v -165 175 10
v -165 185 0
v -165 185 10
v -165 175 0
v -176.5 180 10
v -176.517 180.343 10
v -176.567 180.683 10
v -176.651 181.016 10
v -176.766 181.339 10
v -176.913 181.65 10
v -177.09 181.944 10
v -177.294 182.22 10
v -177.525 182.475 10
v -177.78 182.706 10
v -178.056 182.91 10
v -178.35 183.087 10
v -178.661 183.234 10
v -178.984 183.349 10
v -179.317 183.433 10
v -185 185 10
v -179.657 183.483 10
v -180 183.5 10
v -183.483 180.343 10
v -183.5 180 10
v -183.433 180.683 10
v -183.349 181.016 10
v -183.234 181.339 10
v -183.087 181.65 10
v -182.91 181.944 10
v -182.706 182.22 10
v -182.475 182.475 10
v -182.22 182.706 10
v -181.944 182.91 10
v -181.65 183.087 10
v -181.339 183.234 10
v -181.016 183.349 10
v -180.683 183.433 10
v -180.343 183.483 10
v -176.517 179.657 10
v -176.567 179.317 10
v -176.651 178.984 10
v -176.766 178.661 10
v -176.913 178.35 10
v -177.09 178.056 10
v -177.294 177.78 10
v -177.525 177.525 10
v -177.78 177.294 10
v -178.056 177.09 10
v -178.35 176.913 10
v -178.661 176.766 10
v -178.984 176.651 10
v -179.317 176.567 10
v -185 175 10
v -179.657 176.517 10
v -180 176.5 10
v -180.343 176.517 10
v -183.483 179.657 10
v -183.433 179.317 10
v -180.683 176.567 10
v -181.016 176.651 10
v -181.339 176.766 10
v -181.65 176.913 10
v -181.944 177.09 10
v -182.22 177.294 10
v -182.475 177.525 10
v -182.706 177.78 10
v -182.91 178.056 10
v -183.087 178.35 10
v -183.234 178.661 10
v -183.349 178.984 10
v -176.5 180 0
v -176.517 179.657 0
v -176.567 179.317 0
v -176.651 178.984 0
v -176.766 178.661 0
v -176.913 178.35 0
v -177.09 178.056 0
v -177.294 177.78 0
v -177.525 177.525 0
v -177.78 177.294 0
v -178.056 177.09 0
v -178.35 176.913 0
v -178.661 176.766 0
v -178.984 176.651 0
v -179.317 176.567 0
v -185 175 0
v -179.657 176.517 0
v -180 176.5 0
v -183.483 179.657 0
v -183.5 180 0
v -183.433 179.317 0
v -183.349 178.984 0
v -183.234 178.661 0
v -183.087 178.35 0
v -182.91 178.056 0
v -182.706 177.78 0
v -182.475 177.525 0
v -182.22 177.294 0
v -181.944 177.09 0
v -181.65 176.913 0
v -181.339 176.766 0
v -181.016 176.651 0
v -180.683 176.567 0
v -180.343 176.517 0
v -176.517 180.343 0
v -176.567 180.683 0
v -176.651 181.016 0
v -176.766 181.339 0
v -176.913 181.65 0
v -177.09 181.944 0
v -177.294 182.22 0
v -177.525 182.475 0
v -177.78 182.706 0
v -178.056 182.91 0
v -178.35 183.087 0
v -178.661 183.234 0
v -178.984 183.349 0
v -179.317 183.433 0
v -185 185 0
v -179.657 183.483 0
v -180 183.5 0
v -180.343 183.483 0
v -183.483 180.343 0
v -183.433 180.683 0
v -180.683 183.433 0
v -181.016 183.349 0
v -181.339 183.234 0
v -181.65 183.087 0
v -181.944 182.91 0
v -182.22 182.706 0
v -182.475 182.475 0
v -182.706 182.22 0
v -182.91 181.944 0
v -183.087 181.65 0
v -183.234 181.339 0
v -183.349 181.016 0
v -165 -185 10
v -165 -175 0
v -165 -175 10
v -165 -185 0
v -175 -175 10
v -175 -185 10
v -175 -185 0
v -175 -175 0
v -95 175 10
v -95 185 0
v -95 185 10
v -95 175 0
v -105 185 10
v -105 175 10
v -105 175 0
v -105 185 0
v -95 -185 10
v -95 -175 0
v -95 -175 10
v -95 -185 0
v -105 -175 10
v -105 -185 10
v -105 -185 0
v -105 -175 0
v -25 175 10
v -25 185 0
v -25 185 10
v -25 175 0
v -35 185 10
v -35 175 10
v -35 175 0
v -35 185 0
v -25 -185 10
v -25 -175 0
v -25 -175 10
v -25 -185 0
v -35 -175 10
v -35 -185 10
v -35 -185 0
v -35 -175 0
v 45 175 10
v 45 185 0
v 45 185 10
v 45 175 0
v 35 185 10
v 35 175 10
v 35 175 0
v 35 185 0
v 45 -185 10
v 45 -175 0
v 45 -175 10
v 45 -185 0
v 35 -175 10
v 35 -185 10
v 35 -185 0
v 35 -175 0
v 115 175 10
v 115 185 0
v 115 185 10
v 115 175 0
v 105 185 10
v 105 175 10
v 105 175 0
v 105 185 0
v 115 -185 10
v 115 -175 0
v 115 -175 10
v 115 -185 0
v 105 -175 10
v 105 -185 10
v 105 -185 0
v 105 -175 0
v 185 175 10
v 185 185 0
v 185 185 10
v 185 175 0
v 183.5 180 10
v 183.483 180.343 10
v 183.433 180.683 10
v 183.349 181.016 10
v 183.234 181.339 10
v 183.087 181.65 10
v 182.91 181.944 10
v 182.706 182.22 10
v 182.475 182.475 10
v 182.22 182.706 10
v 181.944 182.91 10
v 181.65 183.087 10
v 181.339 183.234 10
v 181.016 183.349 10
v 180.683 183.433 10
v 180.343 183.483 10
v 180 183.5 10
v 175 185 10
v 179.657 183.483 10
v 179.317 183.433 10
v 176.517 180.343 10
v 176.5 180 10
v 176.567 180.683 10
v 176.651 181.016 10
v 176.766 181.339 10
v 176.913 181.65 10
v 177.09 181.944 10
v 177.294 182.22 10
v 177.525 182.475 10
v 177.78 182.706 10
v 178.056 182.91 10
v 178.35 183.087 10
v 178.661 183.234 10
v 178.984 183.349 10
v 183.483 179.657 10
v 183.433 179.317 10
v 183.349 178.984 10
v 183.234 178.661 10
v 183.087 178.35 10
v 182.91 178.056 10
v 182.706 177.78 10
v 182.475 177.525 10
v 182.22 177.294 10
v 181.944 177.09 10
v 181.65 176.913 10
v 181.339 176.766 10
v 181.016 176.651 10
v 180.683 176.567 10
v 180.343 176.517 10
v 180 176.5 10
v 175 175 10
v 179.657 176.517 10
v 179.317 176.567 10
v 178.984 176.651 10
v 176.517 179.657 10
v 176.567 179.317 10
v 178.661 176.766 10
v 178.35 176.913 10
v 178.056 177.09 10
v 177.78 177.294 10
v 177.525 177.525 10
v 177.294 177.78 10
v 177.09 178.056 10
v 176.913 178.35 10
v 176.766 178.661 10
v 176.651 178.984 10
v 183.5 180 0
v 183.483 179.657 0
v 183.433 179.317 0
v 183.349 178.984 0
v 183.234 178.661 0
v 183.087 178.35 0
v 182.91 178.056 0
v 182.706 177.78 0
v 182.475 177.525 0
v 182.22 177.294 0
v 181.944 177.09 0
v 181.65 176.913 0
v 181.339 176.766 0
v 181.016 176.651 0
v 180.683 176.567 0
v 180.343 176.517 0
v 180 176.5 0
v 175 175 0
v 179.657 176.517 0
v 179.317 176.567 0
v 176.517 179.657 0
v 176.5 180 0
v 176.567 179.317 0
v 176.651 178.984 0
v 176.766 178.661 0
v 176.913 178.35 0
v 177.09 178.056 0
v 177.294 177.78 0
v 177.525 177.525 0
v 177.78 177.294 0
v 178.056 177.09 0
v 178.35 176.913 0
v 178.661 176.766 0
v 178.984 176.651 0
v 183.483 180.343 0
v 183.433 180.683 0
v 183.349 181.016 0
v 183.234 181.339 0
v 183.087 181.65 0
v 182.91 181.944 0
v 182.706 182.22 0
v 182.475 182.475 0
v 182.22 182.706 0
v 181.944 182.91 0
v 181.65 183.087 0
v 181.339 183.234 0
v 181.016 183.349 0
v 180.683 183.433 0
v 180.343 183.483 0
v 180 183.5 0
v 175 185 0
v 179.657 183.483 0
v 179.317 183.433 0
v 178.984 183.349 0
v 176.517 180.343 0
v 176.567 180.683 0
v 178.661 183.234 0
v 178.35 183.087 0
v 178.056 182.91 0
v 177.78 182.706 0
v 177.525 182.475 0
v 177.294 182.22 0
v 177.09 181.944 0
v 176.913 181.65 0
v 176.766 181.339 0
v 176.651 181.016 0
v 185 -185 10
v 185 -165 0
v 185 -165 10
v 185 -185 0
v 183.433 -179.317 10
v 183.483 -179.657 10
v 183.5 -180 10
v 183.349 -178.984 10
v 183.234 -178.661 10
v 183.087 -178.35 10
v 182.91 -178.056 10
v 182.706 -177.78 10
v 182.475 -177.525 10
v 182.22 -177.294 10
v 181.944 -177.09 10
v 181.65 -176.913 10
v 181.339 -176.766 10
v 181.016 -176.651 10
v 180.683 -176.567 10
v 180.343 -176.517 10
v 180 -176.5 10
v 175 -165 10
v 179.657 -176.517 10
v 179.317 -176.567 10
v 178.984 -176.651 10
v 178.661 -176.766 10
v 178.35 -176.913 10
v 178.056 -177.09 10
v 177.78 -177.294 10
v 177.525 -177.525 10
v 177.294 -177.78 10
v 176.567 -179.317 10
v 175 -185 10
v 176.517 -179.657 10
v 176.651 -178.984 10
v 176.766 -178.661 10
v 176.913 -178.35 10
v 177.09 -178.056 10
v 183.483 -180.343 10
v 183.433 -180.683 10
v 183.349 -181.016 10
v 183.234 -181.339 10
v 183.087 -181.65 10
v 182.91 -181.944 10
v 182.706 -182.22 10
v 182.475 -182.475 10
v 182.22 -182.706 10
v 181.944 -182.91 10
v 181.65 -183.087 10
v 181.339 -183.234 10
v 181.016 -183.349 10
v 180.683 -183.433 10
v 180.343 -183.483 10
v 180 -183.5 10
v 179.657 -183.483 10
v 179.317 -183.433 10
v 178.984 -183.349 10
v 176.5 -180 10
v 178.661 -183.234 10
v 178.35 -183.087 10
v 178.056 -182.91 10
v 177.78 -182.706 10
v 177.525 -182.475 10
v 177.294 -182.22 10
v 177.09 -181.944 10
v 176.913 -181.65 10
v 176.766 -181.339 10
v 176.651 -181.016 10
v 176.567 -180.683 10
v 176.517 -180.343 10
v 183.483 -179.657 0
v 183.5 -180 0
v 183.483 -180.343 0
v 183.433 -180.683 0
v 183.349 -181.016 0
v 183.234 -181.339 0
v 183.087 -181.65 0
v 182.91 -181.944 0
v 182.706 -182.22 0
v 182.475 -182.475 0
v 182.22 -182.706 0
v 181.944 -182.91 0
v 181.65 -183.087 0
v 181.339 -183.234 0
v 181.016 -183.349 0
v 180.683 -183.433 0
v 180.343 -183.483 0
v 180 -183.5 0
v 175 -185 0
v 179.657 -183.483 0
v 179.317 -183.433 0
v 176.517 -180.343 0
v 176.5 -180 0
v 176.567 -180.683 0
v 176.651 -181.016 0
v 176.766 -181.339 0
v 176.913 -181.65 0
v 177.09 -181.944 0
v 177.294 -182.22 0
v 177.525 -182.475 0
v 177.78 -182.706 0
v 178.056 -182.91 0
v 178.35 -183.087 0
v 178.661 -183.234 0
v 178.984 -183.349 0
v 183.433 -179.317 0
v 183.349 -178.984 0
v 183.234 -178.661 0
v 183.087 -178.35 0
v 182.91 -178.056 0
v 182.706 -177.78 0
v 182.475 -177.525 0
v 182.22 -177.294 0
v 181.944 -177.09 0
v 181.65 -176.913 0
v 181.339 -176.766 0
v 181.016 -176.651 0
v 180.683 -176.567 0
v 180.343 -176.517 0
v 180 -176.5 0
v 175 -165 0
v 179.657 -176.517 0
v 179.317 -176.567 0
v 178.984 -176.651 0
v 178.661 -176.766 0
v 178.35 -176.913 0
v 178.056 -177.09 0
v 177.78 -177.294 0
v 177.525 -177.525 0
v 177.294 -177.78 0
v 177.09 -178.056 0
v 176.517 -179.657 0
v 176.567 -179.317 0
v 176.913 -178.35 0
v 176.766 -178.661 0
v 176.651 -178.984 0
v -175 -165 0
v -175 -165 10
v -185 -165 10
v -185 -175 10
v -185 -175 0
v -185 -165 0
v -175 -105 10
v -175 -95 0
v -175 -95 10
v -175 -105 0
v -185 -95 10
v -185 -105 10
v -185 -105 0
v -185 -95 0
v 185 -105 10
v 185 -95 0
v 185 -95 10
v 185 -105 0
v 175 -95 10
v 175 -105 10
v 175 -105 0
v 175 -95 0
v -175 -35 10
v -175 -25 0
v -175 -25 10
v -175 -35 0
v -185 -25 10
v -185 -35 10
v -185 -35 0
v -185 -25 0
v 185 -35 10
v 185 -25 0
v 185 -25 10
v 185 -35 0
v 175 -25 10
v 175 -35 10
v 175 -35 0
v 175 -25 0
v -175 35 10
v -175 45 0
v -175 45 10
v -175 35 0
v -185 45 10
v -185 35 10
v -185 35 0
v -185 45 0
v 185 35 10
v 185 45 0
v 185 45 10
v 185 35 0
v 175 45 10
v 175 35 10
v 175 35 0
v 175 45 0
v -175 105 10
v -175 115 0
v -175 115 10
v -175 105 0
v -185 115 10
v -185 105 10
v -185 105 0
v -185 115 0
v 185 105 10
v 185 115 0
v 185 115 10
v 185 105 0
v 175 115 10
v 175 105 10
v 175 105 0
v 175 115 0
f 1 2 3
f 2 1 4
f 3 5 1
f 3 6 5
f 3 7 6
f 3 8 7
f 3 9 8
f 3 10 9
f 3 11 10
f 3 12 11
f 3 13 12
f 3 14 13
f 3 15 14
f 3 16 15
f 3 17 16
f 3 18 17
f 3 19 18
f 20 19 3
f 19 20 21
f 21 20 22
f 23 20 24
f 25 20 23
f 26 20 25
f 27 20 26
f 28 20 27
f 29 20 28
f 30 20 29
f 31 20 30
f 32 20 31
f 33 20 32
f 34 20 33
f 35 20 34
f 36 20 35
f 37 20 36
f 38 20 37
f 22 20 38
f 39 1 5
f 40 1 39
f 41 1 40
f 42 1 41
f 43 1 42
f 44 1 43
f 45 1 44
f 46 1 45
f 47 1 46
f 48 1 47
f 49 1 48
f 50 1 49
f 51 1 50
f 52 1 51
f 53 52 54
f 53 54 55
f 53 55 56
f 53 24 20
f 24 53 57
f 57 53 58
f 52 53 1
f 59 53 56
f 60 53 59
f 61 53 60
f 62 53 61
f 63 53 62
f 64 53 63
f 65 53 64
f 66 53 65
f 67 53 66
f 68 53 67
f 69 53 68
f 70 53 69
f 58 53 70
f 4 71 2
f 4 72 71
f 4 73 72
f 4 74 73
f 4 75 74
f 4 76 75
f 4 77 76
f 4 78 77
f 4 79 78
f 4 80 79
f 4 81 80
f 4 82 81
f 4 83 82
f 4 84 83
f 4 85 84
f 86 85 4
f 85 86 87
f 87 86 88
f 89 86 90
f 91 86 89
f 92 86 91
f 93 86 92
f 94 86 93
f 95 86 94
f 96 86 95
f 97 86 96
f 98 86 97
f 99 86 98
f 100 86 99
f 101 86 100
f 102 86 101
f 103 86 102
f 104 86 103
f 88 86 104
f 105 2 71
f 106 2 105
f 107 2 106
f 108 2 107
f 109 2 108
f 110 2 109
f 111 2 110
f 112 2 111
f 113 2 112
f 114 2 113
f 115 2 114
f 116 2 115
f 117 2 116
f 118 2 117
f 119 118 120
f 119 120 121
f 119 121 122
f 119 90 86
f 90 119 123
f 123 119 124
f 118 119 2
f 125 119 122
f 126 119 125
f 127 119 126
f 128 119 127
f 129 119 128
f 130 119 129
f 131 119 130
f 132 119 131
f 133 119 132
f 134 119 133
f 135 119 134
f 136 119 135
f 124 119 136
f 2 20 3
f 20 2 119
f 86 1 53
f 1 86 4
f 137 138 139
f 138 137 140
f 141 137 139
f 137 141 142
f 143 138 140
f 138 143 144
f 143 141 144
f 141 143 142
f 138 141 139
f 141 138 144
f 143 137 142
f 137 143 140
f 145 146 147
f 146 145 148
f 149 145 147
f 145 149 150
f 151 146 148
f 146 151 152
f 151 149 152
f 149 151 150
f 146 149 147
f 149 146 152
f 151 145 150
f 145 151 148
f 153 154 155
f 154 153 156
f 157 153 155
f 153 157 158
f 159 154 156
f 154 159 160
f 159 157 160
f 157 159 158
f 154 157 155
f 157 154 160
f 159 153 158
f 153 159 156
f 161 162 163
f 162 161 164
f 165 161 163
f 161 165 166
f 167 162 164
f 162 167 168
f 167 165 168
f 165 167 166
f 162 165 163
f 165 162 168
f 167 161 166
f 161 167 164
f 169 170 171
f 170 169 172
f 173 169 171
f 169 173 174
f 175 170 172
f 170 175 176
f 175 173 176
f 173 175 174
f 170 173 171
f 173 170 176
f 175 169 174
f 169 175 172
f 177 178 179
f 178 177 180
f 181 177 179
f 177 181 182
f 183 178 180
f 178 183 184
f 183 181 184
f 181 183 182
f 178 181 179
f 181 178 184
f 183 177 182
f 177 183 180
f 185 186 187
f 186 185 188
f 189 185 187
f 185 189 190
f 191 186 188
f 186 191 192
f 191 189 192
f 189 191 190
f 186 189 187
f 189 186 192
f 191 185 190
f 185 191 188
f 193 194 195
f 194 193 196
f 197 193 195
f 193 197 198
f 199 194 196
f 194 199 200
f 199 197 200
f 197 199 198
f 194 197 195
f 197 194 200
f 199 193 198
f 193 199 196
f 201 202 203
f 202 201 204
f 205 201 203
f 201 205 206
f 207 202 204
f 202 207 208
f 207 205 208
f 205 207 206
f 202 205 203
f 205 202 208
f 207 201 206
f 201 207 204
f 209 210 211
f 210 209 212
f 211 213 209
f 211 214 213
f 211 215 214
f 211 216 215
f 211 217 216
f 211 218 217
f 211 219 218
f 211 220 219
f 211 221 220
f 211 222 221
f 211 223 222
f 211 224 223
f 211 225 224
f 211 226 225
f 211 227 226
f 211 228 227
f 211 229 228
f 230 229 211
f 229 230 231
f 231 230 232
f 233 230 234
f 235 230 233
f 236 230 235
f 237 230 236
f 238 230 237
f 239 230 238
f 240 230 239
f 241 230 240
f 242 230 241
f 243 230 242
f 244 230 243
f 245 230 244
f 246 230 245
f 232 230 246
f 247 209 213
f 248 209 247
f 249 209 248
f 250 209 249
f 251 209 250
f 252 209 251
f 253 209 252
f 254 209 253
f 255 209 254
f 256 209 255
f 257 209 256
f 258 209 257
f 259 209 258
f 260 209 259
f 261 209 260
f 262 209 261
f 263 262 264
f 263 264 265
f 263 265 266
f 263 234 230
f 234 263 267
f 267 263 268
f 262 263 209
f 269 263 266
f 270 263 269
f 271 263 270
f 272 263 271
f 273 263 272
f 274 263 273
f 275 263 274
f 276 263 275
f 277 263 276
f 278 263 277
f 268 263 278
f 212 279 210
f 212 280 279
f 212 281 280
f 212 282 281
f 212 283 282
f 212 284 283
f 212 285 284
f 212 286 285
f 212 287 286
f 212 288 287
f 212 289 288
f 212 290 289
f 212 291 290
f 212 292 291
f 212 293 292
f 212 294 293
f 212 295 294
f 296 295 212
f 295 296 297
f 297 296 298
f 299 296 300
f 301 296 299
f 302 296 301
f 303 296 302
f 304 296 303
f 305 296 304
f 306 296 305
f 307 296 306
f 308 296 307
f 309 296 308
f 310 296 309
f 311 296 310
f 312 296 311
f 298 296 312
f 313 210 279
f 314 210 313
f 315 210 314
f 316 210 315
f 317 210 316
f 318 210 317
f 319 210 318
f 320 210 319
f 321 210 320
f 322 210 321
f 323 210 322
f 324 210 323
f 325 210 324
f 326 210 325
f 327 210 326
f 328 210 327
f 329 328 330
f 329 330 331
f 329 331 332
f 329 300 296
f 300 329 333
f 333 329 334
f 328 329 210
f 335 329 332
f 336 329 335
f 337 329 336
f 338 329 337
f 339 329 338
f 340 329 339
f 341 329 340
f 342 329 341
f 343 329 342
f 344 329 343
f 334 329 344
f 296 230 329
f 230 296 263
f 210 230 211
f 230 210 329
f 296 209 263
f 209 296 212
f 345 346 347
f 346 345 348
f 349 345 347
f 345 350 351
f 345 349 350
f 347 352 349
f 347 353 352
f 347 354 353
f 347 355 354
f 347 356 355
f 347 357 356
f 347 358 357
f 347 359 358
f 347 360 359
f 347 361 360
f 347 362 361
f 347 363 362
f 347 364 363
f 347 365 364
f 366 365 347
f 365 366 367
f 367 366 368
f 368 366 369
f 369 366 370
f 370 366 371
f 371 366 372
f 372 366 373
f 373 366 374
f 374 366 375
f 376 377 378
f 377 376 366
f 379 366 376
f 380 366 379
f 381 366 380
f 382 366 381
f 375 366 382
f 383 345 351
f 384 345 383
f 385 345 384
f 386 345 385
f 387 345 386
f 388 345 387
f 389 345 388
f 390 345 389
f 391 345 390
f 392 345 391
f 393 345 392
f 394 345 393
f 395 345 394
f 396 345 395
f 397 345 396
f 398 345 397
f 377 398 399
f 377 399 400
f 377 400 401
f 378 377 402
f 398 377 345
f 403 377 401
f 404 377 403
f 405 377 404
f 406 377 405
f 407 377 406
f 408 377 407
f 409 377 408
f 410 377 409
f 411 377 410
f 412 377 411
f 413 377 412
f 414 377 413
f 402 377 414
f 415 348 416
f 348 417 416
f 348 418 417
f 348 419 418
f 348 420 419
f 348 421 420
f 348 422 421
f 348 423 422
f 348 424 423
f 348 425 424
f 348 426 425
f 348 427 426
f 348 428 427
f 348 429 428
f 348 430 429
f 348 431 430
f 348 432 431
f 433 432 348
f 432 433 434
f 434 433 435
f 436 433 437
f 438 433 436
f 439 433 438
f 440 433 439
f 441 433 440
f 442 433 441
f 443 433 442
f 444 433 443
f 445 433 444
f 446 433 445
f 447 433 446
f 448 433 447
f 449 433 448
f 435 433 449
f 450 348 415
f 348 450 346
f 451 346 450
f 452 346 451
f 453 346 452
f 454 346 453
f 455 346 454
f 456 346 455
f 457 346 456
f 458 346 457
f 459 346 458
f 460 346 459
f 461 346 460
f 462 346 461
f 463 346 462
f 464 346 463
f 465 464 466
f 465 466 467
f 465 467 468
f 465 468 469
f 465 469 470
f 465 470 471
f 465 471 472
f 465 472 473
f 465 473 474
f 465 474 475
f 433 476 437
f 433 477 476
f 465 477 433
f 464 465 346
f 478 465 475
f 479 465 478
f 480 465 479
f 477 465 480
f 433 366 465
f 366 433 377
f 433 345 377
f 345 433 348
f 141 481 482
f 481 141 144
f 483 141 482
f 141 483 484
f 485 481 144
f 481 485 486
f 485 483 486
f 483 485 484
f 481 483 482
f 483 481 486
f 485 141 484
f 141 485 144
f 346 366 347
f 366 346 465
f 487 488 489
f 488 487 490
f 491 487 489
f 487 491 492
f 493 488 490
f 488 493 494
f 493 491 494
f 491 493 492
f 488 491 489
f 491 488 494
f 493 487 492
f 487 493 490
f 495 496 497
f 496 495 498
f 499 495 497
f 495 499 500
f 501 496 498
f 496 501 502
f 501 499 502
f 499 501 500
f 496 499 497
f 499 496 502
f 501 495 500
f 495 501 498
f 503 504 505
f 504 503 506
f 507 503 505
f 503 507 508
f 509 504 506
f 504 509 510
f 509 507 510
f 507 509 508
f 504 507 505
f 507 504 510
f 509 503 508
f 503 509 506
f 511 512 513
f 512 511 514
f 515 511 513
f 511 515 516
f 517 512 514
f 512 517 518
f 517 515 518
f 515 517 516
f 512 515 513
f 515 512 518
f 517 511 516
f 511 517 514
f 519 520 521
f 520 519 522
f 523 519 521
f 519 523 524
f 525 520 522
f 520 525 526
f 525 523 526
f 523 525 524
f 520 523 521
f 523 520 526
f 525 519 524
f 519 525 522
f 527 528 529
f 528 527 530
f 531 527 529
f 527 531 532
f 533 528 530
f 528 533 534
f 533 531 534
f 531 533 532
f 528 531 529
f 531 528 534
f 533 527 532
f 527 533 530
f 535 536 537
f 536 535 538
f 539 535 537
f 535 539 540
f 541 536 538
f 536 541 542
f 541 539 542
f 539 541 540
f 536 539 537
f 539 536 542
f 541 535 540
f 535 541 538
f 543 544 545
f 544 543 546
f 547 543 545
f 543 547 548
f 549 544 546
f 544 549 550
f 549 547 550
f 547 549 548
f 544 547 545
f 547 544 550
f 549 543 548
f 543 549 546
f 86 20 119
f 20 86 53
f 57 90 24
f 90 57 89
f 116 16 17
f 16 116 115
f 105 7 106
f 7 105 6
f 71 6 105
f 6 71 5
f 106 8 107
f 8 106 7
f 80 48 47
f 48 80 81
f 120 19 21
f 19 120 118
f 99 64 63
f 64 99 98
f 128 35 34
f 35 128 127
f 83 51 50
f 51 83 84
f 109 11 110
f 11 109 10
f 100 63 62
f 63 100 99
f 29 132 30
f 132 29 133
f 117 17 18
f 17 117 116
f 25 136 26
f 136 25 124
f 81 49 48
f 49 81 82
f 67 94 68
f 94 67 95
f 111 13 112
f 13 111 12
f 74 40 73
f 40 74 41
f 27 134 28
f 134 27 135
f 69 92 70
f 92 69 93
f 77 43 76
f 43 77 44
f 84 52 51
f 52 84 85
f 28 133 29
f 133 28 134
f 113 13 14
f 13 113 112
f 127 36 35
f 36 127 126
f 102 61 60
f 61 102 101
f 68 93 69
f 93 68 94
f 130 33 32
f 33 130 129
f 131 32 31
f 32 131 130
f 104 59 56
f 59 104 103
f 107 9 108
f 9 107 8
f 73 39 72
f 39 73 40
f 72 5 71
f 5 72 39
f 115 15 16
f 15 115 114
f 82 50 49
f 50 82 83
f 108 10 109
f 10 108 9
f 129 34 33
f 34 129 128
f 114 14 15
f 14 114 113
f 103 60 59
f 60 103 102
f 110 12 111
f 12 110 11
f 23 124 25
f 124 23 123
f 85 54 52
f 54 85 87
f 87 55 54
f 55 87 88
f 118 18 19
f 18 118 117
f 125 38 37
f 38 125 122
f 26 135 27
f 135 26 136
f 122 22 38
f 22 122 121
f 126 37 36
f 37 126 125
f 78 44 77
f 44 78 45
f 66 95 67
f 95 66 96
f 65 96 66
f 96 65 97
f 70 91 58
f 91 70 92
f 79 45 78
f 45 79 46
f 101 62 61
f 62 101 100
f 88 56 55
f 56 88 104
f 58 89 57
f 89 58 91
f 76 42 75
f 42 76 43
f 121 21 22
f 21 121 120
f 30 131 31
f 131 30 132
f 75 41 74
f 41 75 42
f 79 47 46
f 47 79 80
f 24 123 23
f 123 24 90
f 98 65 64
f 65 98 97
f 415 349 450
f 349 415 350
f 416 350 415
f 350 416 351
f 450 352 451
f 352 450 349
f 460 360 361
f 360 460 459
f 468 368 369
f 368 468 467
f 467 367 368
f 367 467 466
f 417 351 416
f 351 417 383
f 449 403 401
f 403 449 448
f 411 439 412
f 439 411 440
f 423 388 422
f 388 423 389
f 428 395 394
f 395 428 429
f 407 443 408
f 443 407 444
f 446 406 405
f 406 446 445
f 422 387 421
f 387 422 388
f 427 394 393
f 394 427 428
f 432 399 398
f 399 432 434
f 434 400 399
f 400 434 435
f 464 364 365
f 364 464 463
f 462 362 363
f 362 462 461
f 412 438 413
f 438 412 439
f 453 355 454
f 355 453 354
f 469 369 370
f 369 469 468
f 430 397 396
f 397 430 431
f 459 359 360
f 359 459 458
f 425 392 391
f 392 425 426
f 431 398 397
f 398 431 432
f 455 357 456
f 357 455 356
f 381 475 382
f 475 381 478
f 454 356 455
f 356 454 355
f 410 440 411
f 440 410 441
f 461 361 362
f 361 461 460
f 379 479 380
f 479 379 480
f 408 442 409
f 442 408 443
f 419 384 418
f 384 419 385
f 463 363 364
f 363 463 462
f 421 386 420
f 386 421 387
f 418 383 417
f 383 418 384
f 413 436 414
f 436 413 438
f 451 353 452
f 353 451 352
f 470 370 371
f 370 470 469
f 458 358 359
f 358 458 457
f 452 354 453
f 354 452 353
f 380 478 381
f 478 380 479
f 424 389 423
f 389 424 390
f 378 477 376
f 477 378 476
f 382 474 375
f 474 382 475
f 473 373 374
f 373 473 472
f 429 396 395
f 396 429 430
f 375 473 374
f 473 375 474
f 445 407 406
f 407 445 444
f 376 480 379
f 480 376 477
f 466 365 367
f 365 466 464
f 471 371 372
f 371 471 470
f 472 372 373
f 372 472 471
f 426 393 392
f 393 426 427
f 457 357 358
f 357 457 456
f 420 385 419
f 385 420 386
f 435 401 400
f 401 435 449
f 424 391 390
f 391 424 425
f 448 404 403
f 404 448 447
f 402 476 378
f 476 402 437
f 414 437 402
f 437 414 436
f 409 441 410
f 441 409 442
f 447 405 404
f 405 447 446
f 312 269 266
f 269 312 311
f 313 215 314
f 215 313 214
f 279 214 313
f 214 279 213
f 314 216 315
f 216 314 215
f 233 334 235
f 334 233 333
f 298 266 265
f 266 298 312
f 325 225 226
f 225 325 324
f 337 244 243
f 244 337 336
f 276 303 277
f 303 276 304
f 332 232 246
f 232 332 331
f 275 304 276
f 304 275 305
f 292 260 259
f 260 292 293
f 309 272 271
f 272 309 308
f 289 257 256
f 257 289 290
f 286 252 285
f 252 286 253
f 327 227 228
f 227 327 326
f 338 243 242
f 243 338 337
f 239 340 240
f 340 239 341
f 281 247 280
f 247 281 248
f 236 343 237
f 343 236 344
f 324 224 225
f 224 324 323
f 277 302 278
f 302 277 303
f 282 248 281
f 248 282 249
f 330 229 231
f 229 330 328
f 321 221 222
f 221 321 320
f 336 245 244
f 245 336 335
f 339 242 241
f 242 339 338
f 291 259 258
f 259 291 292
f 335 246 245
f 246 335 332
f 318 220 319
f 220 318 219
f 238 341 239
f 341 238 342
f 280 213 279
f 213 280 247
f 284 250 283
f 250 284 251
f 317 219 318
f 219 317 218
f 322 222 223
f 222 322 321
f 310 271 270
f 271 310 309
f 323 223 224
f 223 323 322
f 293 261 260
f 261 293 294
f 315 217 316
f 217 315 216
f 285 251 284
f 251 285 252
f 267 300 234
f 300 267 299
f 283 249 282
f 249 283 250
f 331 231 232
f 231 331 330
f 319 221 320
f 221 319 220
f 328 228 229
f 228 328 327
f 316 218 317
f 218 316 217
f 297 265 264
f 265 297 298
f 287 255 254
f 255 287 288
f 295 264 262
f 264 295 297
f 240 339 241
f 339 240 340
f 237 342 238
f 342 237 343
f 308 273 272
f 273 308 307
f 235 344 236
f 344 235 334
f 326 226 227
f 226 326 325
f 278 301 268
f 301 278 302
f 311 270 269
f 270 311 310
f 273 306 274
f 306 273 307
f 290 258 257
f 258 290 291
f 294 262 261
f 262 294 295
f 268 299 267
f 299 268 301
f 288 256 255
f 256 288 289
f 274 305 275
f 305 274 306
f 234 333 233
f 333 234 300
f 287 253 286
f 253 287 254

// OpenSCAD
// ring_59.scad - ring index 59 (z bottom = 590 mm)
$fn = 64; bar = 10; half_b = bar/2; outer = 370; half_outer = outer/2;
front_y = 180; back_y = -180; left_x = -180; right_x = 180;
x_centers = [-170, -100, -30, 40, 110, 180];
z_centers = [5, 85, 155, 225, 295, 365, 435, 505, 575, 645, 715]; ring_z = 590;
module place_box(cx, cy, sx, sy) { translate([cx - sx/2, cy - sy/2, 0]) cube([sx, sy, bar]); }

difference() { union() {
    for (x = x_centers) { place_box(x, front_y, bar, bar); place_box(x, back_y, bar, bar); }
    for (y = x_centers) { place_box(left_x, y, bar, bar); place_box(right_x, y, bar, bar); }
    for (zc = z_centers) if ((zc - half_b < ring_z + bar) && (zc + half_b > ring_z)) {
        translate([-half_outer, front_y - half_b, 0]) cube([outer, bar, bar]);
        translate([-half_outer, back_y - half_b, 0])  cube([outer, bar, bar]);
        translate([left_x - half_b, -half_outer, 0])  cube([bar, outer, bar]);
        translate([right_x - half_b, -half_outer, 0]) cube([bar, outer, bar]);
    }
  }
  for (cx = [-180, 180]) for (cy = [-180, 180]) translate([cx, cy, 0]) cylinder(h = bar, r = 3.5, $fn = 64);
}
